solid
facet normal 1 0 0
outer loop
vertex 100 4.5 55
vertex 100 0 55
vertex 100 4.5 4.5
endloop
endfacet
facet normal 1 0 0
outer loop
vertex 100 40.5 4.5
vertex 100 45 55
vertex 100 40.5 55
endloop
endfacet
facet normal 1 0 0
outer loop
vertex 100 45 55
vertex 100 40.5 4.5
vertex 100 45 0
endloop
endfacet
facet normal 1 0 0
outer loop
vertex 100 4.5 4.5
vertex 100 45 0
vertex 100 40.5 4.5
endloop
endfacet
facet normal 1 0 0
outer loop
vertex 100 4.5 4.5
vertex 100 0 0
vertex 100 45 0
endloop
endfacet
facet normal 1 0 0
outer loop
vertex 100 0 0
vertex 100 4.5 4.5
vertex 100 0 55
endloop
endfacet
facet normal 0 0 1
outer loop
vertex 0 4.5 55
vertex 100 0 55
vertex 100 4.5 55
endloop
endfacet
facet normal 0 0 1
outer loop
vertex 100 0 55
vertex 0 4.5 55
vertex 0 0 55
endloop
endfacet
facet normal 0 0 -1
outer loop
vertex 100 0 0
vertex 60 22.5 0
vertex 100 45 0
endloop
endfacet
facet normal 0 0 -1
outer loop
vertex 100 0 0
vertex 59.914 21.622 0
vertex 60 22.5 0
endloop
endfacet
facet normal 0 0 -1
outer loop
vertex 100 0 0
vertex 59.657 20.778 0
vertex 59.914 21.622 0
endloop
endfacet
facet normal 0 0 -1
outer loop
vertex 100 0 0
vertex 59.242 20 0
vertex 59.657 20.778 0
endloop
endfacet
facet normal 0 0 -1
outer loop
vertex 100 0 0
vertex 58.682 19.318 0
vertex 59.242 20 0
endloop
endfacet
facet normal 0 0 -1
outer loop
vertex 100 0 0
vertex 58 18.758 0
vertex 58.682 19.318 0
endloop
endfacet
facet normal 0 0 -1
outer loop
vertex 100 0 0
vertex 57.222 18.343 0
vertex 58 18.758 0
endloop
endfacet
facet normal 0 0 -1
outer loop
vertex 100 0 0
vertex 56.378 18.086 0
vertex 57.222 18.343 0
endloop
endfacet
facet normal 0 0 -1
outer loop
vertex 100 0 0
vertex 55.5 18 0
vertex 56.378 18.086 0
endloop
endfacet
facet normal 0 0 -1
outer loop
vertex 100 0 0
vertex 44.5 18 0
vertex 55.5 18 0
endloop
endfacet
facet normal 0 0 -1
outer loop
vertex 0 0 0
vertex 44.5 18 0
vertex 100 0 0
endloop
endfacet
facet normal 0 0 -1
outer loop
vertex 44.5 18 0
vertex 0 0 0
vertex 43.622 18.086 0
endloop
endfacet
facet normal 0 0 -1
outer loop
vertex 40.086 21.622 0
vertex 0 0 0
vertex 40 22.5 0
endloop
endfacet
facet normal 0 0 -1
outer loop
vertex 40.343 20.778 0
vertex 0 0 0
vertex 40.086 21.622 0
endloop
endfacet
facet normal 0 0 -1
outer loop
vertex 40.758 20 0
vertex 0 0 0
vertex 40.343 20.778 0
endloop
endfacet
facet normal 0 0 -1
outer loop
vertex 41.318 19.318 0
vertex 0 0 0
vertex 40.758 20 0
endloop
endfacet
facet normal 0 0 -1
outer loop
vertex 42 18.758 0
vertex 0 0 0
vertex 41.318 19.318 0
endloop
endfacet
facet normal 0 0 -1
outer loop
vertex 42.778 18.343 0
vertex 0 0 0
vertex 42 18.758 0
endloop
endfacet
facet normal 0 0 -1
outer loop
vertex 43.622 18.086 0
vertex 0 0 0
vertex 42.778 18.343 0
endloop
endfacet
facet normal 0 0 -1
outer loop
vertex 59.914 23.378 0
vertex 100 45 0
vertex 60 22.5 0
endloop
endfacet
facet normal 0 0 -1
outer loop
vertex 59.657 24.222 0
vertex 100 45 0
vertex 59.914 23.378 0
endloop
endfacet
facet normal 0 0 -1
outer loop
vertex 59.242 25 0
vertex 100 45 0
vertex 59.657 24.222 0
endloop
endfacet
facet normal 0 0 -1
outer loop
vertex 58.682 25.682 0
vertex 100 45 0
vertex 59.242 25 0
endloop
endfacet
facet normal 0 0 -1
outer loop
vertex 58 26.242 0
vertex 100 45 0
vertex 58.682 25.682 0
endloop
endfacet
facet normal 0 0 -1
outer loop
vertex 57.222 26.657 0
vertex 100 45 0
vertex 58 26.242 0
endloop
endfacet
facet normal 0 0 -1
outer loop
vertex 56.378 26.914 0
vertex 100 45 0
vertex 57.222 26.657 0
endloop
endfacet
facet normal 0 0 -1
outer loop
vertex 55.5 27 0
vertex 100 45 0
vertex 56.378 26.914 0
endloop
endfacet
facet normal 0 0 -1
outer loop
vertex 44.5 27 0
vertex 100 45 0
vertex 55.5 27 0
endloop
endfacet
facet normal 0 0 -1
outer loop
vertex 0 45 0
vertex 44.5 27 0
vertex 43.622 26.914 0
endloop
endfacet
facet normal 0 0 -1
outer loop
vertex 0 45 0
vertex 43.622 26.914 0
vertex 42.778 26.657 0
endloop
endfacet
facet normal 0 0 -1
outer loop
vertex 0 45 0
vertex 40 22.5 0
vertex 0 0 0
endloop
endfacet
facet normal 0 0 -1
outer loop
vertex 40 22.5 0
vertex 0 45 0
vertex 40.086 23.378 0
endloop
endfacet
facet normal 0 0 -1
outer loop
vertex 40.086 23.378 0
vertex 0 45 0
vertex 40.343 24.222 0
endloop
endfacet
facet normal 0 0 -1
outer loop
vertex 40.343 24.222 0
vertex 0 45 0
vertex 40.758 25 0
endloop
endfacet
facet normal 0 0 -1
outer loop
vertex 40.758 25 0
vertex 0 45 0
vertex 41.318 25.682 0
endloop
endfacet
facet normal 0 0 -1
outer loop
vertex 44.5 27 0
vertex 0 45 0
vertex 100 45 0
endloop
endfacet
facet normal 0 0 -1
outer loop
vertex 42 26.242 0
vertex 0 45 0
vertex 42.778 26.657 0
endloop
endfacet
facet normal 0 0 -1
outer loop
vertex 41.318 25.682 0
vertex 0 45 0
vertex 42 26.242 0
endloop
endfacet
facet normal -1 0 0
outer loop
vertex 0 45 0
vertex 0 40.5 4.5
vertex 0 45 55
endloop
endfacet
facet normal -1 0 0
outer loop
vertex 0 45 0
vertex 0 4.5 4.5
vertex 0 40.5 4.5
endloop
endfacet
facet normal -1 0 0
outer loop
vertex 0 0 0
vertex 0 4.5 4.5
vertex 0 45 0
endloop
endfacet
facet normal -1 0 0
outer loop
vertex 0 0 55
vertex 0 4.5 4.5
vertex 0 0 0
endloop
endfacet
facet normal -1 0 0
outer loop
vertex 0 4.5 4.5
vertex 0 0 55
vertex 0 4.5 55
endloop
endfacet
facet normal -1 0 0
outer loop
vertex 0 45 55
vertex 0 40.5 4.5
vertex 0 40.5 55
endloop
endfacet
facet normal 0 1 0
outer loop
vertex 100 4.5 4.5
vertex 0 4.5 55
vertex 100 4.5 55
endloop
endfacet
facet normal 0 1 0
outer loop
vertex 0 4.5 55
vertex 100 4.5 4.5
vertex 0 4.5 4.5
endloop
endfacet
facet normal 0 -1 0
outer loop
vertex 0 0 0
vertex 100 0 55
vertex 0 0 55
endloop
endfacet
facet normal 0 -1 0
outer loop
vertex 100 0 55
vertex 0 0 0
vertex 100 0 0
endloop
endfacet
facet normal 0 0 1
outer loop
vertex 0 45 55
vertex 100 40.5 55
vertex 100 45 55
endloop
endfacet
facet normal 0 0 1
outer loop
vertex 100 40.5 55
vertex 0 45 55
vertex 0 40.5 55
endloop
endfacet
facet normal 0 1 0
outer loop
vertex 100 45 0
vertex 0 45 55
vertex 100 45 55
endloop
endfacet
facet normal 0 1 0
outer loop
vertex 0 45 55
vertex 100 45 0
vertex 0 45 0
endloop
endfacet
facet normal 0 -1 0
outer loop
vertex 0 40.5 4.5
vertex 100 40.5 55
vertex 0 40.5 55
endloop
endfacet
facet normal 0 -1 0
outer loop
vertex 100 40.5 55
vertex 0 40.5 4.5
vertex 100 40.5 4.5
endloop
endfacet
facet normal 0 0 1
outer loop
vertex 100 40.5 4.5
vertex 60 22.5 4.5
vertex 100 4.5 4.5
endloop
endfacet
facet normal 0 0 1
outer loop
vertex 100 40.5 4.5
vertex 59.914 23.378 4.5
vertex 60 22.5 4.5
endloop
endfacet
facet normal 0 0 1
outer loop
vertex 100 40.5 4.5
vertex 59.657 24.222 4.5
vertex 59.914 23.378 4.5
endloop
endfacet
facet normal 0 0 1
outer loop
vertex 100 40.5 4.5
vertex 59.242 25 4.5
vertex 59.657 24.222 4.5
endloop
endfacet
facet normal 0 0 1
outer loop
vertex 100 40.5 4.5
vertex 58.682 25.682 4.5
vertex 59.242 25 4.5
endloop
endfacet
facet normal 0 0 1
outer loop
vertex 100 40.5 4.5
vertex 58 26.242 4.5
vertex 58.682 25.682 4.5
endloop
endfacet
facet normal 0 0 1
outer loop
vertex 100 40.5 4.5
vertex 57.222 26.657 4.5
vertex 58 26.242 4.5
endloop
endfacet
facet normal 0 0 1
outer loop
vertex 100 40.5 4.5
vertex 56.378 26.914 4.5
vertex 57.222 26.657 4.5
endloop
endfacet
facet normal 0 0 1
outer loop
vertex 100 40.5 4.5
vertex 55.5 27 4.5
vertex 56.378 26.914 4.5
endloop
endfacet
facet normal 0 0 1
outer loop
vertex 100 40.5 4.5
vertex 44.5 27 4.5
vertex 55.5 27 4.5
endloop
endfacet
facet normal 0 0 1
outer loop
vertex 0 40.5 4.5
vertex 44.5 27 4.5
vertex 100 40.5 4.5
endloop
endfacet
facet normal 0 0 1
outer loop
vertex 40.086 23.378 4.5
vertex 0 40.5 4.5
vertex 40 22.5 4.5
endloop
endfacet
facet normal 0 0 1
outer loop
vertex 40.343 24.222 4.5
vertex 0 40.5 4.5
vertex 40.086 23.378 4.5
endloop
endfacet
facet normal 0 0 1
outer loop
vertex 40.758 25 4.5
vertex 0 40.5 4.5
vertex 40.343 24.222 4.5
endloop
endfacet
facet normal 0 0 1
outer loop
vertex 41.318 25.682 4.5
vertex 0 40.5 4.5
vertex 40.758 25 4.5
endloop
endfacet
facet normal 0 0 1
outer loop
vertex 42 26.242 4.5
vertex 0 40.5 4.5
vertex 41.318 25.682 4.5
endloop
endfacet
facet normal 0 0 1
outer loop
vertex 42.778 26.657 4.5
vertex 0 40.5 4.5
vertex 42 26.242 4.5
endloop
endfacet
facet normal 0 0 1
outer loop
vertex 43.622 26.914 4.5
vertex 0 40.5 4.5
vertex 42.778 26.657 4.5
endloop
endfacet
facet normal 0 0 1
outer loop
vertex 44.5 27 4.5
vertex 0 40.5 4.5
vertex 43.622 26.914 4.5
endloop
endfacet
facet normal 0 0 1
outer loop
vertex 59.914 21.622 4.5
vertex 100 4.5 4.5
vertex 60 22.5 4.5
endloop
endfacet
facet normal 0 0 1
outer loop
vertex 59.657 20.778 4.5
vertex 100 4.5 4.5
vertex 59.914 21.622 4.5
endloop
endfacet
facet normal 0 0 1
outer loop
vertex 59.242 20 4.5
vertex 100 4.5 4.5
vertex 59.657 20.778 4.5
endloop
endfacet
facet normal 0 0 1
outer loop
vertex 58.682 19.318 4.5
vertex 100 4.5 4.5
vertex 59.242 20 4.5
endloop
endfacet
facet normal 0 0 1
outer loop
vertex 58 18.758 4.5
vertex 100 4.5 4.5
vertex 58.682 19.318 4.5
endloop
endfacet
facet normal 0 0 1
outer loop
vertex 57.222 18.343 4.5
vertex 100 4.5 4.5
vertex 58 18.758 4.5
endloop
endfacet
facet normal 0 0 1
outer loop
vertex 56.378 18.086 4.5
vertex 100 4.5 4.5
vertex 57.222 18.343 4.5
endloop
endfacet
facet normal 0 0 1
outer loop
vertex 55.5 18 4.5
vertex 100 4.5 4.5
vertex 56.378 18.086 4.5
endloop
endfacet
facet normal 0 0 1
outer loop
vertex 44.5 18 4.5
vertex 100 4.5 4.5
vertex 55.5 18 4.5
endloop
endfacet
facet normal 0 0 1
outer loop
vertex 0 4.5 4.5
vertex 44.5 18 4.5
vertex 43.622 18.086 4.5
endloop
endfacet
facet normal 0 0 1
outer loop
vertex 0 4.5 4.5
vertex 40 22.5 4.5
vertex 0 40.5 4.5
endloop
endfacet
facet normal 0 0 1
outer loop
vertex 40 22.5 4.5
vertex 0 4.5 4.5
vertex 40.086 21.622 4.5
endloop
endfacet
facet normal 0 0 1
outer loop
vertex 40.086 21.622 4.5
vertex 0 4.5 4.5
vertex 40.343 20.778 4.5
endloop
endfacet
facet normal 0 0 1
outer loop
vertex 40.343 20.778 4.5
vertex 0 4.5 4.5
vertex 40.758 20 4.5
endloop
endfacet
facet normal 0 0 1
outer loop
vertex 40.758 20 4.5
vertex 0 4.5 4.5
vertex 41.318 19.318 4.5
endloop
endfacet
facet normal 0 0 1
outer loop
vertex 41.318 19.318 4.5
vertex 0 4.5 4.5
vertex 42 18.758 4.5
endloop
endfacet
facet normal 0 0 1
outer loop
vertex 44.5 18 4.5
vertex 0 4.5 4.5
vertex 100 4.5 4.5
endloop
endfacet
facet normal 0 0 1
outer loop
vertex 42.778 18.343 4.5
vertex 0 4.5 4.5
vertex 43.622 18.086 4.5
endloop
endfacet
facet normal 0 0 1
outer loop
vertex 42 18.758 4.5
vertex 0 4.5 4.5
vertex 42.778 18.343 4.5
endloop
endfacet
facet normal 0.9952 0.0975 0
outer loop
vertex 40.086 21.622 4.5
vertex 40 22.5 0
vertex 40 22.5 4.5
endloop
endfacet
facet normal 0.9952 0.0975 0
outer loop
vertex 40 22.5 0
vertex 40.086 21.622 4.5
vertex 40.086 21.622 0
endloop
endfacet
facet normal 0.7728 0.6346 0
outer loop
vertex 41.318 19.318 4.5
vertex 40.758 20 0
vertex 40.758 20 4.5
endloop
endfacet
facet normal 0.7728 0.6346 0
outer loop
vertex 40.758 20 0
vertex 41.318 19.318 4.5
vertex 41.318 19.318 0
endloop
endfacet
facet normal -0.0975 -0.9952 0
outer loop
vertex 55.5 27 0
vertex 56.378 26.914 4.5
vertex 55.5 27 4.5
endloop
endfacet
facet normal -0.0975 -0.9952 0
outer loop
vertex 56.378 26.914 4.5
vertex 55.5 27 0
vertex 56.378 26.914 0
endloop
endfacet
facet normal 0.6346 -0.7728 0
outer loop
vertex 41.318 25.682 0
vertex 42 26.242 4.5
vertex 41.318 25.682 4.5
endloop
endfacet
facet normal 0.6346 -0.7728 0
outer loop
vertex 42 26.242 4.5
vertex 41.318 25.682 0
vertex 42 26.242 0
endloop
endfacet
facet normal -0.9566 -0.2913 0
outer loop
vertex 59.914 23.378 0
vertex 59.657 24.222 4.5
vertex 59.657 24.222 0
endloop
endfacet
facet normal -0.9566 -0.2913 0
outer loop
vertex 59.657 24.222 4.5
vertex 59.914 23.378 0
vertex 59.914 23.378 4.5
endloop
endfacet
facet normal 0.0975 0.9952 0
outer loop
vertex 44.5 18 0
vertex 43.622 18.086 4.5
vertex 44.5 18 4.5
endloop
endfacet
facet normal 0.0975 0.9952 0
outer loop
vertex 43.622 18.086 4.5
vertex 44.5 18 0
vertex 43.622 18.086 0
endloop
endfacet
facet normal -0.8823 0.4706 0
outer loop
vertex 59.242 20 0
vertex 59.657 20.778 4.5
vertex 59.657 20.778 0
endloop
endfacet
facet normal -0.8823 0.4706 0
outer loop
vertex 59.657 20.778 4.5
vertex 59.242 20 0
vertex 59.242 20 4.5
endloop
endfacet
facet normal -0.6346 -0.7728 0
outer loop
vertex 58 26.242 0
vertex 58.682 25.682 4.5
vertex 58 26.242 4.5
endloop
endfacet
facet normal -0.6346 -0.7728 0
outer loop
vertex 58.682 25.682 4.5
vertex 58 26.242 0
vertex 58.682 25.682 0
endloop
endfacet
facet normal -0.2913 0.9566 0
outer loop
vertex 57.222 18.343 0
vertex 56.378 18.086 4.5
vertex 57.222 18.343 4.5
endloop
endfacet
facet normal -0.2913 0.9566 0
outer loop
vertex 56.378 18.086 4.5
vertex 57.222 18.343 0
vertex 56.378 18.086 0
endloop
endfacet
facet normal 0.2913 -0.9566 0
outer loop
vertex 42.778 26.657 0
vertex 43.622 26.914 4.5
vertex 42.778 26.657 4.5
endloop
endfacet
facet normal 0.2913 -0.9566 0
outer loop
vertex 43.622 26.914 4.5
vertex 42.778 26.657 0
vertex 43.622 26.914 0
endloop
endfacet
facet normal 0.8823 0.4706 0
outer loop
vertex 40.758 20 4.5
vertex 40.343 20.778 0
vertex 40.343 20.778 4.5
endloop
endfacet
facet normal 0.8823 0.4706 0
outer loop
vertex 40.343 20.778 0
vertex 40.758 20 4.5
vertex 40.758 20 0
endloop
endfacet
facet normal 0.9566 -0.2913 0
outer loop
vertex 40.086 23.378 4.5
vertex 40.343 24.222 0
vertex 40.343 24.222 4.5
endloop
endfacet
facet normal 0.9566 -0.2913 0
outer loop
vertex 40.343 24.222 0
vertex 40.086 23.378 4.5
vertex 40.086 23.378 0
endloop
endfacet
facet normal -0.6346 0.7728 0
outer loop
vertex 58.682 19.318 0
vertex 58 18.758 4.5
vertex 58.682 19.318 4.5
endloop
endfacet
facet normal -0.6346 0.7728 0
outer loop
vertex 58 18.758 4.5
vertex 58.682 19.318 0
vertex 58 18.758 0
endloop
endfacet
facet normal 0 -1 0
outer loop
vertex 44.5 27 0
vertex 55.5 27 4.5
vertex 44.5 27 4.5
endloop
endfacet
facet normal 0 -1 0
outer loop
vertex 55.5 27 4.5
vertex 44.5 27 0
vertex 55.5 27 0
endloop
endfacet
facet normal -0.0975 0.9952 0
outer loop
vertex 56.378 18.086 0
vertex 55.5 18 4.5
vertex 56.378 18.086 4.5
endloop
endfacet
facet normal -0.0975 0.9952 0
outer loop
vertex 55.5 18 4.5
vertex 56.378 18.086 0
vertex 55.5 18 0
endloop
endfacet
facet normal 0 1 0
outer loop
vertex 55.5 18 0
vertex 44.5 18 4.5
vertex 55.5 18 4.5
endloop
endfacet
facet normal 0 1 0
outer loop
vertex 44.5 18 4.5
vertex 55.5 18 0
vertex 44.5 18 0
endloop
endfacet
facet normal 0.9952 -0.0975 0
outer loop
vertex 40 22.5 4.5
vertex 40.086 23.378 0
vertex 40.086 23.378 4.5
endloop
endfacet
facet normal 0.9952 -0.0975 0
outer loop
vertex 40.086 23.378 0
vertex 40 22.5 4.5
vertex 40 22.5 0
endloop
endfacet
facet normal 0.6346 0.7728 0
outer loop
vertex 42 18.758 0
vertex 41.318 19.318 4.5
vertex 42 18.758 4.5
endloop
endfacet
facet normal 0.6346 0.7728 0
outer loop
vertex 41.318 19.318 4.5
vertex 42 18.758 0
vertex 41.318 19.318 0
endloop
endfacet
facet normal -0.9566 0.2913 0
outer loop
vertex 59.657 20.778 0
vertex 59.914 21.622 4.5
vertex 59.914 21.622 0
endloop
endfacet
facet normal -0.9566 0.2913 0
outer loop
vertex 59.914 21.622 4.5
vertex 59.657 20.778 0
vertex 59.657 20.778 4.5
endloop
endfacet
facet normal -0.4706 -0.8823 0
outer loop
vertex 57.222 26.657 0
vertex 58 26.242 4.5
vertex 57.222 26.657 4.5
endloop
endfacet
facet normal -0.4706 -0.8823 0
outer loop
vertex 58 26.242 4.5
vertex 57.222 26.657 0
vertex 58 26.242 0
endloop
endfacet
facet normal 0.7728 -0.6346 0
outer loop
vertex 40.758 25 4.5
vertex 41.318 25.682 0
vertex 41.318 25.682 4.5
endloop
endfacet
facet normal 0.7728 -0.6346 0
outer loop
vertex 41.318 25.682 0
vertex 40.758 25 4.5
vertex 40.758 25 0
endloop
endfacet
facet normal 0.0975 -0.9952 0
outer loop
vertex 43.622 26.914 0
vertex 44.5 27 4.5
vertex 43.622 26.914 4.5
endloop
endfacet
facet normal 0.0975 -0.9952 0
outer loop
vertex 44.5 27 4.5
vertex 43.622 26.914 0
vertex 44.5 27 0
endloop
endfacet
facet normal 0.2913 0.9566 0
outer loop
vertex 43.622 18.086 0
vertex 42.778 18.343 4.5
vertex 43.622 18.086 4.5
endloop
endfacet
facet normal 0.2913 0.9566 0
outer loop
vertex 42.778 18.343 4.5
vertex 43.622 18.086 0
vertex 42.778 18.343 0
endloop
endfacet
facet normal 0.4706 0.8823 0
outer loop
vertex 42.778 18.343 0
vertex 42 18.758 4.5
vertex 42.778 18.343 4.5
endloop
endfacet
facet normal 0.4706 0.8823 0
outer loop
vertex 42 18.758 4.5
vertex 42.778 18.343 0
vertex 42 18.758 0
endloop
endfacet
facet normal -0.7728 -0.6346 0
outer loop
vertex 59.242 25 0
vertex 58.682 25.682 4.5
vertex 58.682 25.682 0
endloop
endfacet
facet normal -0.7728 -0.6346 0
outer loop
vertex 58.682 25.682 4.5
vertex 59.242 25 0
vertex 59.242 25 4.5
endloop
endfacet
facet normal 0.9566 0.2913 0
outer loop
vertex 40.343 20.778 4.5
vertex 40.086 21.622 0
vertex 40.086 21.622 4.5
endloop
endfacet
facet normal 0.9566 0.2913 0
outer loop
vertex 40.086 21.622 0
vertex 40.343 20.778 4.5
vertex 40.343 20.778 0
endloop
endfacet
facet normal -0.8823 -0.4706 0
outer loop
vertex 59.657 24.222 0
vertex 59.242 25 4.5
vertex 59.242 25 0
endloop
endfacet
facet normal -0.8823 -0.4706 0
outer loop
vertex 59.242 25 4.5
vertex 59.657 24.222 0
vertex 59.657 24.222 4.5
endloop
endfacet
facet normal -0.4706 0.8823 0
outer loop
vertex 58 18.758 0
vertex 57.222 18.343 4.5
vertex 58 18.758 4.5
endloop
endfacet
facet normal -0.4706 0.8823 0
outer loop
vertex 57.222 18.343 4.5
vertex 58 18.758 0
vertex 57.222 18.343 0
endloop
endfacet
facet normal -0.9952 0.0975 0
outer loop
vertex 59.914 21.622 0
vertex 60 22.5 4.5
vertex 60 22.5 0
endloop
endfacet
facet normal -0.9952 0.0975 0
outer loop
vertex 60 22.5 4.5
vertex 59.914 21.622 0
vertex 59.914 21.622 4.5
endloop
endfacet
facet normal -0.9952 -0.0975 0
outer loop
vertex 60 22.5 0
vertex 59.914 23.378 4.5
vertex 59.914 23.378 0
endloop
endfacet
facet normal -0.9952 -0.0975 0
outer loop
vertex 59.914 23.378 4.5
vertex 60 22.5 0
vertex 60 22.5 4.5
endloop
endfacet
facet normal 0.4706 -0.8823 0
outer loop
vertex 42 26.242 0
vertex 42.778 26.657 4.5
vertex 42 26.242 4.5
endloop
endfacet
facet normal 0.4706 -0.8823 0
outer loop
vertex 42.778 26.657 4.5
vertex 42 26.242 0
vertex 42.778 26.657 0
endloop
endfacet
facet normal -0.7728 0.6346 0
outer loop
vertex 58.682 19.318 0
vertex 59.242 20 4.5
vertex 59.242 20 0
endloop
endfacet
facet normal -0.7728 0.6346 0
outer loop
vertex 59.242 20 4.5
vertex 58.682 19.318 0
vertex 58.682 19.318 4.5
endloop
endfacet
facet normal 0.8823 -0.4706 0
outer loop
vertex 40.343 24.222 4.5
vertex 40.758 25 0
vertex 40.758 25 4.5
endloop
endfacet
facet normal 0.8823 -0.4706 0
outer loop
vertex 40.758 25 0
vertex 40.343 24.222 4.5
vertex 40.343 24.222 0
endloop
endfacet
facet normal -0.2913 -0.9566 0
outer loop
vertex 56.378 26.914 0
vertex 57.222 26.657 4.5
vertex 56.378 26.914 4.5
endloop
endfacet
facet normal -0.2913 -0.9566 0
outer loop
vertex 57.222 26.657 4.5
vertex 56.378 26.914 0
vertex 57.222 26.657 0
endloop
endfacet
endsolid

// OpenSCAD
$fn = 32;

// ----------------------------------------------------------------------
// U-bracket: 100 x 45 x 55 mm
// ----------------------------------------------------------------------

// --- parameters (mm) ---
base_len = 100;           // outer length, X
channel_w = 45;           // outer width, Y
upright_h = 55;           // upright height, Z
mat_t = 4.5;              // wall thickness
hole_d = 9;               // clearance for M8
slot_l = 20;              // slot length

module hole_z(px, py) {
  translate([px, py, -2.5]) cylinder(h = mat_t + 5, d = hole_d);
}
module hole_y_pz(pz) {
  /* through both uprights along Y */
  translate([0, -2.5, pz]) rotate([-90, 0, 0]) cylinder(h = channel_w + 5, d = hole_d);
}
module slot_z(px, py) {
  hull() {
    translate([px - (slot_l - hole_d) / 2, py, -2.5]) cylinder(h = mat_t + 5, d = hole_d);
    translate([px + (slot_l - hole_d) / 2, py, -2.5]) cylinder(h = mat_t + 5, d = hole_d);
  }
}

module base() {
  cube([base_len, channel_w, mat_t]);
}

module uprights() {
  cube([base_len, mat_t, upright_h]);
  translate([0, channel_w - mat_t, 0]) cube([base_len, mat_t, upright_h]);
}

difference() {
  union() {
    base();
    uprights();
  }
  slot_z(50, 22.5);
}
